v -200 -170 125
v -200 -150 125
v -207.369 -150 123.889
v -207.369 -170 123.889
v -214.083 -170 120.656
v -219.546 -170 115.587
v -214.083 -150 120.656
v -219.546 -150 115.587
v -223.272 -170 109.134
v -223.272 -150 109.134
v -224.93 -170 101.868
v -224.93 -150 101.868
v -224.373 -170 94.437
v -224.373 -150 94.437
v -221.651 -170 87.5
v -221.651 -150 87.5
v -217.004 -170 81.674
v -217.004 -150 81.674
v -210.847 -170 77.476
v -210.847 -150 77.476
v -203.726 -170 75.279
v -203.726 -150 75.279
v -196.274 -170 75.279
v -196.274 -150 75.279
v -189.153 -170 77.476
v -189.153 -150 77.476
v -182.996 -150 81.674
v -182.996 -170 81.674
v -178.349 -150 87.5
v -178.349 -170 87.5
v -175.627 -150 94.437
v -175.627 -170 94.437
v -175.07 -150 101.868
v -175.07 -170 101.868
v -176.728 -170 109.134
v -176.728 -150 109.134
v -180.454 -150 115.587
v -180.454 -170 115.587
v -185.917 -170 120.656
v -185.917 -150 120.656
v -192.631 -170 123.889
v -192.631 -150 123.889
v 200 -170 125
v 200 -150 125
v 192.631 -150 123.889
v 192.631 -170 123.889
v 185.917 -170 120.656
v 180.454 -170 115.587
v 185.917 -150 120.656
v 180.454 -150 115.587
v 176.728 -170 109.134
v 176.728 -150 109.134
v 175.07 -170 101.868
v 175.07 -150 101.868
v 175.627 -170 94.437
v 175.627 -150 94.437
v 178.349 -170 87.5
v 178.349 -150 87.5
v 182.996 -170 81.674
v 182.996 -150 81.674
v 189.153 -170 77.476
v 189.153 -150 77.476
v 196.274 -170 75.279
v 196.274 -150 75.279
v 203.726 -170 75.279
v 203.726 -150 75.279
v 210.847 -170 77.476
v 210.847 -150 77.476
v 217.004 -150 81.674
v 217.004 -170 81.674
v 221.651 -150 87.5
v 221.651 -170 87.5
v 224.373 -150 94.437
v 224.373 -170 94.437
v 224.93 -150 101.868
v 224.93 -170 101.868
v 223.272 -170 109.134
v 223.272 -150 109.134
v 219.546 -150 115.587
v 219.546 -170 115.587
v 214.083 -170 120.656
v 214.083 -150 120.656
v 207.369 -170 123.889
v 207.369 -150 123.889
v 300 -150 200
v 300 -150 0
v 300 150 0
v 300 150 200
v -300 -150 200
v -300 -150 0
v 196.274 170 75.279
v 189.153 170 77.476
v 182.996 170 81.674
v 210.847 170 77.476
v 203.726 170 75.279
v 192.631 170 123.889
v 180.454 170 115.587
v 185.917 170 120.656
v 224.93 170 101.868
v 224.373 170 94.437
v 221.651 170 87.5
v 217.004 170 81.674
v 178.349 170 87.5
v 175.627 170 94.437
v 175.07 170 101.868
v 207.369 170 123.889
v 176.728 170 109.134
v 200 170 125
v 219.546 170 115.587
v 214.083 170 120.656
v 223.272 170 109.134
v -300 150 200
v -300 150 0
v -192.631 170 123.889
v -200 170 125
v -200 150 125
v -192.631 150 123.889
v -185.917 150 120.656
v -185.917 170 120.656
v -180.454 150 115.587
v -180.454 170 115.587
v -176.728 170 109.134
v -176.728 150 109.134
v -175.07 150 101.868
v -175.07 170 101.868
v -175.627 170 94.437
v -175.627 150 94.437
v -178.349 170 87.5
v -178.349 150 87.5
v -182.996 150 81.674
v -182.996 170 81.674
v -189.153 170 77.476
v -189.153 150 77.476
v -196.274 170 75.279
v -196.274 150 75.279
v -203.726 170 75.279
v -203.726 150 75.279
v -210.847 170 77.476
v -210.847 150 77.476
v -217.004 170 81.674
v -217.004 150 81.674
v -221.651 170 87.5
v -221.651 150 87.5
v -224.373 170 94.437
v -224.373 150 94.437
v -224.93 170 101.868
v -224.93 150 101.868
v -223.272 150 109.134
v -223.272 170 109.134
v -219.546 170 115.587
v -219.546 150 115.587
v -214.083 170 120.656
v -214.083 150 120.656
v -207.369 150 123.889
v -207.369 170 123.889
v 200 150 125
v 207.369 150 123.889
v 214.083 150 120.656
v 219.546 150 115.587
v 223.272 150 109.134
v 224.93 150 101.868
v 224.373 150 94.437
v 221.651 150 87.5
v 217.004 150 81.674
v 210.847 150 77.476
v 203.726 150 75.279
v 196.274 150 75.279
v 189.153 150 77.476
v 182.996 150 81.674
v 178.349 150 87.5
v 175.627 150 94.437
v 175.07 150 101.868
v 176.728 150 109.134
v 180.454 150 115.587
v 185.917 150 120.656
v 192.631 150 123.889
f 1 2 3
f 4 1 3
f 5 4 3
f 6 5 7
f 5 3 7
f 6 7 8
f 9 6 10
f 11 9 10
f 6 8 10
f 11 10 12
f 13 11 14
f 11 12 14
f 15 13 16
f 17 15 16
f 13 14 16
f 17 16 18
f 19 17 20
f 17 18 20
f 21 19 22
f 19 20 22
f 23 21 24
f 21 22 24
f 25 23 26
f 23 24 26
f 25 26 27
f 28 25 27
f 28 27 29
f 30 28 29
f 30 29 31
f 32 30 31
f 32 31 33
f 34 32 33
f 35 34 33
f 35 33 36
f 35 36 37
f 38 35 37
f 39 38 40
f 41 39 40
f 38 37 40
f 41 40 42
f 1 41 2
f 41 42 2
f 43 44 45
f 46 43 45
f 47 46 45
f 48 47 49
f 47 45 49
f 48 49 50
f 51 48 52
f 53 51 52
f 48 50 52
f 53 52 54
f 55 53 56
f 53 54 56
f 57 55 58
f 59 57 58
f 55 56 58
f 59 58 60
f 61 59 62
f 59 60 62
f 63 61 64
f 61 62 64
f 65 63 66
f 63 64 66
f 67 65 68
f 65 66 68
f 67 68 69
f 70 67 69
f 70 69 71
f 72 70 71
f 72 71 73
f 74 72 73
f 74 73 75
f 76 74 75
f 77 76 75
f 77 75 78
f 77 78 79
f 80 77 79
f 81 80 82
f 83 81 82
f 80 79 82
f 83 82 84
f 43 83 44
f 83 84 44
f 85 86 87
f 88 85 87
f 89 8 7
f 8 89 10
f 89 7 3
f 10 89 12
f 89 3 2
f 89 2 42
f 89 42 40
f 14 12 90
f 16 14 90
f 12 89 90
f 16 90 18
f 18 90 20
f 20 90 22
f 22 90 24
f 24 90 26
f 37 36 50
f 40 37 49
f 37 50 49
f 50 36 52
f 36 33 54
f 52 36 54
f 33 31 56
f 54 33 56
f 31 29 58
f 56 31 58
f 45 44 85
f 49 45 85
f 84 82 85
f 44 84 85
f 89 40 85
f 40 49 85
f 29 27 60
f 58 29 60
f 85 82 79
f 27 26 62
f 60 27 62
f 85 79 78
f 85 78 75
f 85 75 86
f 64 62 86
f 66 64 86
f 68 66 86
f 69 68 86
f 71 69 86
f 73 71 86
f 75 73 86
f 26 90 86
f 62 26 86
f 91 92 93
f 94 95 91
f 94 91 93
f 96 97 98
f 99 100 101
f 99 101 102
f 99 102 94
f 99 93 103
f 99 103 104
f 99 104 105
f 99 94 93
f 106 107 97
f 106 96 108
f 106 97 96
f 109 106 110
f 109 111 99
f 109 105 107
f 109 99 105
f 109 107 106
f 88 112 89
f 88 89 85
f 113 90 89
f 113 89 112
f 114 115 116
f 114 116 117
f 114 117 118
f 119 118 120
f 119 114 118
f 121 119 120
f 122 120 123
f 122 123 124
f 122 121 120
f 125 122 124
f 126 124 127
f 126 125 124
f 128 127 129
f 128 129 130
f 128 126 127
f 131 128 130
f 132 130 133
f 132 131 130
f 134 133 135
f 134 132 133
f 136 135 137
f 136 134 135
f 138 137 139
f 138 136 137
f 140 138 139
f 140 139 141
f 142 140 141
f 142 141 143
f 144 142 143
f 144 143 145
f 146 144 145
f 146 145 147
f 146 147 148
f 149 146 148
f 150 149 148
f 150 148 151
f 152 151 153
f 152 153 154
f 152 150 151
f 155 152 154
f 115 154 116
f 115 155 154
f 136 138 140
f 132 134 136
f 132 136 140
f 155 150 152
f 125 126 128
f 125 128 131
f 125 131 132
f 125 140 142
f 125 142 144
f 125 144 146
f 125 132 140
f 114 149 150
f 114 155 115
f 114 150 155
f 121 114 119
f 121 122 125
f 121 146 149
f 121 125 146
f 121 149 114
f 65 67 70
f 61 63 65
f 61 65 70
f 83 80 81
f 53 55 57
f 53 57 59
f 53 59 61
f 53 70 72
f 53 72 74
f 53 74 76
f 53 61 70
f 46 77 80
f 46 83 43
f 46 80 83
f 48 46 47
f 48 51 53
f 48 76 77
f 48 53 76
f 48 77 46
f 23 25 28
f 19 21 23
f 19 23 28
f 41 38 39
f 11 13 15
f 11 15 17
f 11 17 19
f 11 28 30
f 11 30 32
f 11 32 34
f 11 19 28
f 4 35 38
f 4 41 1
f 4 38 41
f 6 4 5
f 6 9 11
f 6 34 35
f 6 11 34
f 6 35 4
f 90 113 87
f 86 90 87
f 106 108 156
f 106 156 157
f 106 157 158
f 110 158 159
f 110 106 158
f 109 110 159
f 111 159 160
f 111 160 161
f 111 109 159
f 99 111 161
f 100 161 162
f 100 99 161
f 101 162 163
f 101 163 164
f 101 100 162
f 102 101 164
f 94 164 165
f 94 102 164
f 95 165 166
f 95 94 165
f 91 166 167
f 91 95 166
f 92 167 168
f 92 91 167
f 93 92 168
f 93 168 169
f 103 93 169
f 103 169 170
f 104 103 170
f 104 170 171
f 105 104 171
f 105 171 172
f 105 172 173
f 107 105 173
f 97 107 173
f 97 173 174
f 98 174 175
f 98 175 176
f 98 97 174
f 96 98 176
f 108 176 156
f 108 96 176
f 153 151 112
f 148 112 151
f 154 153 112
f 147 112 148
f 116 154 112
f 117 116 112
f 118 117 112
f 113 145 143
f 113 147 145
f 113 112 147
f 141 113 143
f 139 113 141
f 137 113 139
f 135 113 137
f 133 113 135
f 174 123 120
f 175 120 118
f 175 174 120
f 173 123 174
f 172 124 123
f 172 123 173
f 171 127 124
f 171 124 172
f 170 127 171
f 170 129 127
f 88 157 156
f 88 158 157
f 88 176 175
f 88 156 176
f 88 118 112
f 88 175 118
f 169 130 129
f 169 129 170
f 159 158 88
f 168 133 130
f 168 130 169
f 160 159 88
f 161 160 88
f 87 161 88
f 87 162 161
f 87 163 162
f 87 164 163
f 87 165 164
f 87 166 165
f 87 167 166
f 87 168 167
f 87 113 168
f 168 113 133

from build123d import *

# Parameters (mm, degrees)
SKETCH_1_W      = 600
SKETCH_1_H      = 300
EXTRUDE_1_DEPTH = 200
SKETCH_2_R      = 25
EXTRUDE_2_DEPTH = 20
EXTRUDE_START   = 20
SKETCH_3_R      = 25
EXTRUDE_3_DEPTH = 20


with BuildPart() as part:
    # 草图1 → 凸台-拉伸1 (new body)
    with BuildSketch(Plane.XY):
        Rectangle(SKETCH_1_W, SKETCH_1_H)
    extrude(amount=EXTRUDE_1_DEPTH)

    # 草图2 → 凸台-拉伸2 (add)
    with BuildSketch(Plane.XZ.offset(150)):
        with Locations(Location((-200, 100, 0), (0, 0, 90))):
            Circle(SKETCH_2_R)
        with Locations(Location((200, 100, 0), (0, 0, 90))):
            Circle(SKETCH_2_R)
    extrude(amount=EXTRUDE_2_DEPTH)

    # 草图3 → 凸台-拉伸3 (add)
    with BuildSketch(Plane(origin=(0, 150, 0), x_dir=(1, 0, 0), z_dir=(0, 1, 0)).offset(EXTRUDE_START)):
        with Locations(Location((200, -100, 0), (0, 0, 270))):
            Circle(SKETCH_3_R)
        with Locations(Location((-200, -100, 0), (0, 0, 270))):
            Circle(SKETCH_3_R)
    extrude(amount=-EXTRUDE_3_DEPTH)


solid = part.part
